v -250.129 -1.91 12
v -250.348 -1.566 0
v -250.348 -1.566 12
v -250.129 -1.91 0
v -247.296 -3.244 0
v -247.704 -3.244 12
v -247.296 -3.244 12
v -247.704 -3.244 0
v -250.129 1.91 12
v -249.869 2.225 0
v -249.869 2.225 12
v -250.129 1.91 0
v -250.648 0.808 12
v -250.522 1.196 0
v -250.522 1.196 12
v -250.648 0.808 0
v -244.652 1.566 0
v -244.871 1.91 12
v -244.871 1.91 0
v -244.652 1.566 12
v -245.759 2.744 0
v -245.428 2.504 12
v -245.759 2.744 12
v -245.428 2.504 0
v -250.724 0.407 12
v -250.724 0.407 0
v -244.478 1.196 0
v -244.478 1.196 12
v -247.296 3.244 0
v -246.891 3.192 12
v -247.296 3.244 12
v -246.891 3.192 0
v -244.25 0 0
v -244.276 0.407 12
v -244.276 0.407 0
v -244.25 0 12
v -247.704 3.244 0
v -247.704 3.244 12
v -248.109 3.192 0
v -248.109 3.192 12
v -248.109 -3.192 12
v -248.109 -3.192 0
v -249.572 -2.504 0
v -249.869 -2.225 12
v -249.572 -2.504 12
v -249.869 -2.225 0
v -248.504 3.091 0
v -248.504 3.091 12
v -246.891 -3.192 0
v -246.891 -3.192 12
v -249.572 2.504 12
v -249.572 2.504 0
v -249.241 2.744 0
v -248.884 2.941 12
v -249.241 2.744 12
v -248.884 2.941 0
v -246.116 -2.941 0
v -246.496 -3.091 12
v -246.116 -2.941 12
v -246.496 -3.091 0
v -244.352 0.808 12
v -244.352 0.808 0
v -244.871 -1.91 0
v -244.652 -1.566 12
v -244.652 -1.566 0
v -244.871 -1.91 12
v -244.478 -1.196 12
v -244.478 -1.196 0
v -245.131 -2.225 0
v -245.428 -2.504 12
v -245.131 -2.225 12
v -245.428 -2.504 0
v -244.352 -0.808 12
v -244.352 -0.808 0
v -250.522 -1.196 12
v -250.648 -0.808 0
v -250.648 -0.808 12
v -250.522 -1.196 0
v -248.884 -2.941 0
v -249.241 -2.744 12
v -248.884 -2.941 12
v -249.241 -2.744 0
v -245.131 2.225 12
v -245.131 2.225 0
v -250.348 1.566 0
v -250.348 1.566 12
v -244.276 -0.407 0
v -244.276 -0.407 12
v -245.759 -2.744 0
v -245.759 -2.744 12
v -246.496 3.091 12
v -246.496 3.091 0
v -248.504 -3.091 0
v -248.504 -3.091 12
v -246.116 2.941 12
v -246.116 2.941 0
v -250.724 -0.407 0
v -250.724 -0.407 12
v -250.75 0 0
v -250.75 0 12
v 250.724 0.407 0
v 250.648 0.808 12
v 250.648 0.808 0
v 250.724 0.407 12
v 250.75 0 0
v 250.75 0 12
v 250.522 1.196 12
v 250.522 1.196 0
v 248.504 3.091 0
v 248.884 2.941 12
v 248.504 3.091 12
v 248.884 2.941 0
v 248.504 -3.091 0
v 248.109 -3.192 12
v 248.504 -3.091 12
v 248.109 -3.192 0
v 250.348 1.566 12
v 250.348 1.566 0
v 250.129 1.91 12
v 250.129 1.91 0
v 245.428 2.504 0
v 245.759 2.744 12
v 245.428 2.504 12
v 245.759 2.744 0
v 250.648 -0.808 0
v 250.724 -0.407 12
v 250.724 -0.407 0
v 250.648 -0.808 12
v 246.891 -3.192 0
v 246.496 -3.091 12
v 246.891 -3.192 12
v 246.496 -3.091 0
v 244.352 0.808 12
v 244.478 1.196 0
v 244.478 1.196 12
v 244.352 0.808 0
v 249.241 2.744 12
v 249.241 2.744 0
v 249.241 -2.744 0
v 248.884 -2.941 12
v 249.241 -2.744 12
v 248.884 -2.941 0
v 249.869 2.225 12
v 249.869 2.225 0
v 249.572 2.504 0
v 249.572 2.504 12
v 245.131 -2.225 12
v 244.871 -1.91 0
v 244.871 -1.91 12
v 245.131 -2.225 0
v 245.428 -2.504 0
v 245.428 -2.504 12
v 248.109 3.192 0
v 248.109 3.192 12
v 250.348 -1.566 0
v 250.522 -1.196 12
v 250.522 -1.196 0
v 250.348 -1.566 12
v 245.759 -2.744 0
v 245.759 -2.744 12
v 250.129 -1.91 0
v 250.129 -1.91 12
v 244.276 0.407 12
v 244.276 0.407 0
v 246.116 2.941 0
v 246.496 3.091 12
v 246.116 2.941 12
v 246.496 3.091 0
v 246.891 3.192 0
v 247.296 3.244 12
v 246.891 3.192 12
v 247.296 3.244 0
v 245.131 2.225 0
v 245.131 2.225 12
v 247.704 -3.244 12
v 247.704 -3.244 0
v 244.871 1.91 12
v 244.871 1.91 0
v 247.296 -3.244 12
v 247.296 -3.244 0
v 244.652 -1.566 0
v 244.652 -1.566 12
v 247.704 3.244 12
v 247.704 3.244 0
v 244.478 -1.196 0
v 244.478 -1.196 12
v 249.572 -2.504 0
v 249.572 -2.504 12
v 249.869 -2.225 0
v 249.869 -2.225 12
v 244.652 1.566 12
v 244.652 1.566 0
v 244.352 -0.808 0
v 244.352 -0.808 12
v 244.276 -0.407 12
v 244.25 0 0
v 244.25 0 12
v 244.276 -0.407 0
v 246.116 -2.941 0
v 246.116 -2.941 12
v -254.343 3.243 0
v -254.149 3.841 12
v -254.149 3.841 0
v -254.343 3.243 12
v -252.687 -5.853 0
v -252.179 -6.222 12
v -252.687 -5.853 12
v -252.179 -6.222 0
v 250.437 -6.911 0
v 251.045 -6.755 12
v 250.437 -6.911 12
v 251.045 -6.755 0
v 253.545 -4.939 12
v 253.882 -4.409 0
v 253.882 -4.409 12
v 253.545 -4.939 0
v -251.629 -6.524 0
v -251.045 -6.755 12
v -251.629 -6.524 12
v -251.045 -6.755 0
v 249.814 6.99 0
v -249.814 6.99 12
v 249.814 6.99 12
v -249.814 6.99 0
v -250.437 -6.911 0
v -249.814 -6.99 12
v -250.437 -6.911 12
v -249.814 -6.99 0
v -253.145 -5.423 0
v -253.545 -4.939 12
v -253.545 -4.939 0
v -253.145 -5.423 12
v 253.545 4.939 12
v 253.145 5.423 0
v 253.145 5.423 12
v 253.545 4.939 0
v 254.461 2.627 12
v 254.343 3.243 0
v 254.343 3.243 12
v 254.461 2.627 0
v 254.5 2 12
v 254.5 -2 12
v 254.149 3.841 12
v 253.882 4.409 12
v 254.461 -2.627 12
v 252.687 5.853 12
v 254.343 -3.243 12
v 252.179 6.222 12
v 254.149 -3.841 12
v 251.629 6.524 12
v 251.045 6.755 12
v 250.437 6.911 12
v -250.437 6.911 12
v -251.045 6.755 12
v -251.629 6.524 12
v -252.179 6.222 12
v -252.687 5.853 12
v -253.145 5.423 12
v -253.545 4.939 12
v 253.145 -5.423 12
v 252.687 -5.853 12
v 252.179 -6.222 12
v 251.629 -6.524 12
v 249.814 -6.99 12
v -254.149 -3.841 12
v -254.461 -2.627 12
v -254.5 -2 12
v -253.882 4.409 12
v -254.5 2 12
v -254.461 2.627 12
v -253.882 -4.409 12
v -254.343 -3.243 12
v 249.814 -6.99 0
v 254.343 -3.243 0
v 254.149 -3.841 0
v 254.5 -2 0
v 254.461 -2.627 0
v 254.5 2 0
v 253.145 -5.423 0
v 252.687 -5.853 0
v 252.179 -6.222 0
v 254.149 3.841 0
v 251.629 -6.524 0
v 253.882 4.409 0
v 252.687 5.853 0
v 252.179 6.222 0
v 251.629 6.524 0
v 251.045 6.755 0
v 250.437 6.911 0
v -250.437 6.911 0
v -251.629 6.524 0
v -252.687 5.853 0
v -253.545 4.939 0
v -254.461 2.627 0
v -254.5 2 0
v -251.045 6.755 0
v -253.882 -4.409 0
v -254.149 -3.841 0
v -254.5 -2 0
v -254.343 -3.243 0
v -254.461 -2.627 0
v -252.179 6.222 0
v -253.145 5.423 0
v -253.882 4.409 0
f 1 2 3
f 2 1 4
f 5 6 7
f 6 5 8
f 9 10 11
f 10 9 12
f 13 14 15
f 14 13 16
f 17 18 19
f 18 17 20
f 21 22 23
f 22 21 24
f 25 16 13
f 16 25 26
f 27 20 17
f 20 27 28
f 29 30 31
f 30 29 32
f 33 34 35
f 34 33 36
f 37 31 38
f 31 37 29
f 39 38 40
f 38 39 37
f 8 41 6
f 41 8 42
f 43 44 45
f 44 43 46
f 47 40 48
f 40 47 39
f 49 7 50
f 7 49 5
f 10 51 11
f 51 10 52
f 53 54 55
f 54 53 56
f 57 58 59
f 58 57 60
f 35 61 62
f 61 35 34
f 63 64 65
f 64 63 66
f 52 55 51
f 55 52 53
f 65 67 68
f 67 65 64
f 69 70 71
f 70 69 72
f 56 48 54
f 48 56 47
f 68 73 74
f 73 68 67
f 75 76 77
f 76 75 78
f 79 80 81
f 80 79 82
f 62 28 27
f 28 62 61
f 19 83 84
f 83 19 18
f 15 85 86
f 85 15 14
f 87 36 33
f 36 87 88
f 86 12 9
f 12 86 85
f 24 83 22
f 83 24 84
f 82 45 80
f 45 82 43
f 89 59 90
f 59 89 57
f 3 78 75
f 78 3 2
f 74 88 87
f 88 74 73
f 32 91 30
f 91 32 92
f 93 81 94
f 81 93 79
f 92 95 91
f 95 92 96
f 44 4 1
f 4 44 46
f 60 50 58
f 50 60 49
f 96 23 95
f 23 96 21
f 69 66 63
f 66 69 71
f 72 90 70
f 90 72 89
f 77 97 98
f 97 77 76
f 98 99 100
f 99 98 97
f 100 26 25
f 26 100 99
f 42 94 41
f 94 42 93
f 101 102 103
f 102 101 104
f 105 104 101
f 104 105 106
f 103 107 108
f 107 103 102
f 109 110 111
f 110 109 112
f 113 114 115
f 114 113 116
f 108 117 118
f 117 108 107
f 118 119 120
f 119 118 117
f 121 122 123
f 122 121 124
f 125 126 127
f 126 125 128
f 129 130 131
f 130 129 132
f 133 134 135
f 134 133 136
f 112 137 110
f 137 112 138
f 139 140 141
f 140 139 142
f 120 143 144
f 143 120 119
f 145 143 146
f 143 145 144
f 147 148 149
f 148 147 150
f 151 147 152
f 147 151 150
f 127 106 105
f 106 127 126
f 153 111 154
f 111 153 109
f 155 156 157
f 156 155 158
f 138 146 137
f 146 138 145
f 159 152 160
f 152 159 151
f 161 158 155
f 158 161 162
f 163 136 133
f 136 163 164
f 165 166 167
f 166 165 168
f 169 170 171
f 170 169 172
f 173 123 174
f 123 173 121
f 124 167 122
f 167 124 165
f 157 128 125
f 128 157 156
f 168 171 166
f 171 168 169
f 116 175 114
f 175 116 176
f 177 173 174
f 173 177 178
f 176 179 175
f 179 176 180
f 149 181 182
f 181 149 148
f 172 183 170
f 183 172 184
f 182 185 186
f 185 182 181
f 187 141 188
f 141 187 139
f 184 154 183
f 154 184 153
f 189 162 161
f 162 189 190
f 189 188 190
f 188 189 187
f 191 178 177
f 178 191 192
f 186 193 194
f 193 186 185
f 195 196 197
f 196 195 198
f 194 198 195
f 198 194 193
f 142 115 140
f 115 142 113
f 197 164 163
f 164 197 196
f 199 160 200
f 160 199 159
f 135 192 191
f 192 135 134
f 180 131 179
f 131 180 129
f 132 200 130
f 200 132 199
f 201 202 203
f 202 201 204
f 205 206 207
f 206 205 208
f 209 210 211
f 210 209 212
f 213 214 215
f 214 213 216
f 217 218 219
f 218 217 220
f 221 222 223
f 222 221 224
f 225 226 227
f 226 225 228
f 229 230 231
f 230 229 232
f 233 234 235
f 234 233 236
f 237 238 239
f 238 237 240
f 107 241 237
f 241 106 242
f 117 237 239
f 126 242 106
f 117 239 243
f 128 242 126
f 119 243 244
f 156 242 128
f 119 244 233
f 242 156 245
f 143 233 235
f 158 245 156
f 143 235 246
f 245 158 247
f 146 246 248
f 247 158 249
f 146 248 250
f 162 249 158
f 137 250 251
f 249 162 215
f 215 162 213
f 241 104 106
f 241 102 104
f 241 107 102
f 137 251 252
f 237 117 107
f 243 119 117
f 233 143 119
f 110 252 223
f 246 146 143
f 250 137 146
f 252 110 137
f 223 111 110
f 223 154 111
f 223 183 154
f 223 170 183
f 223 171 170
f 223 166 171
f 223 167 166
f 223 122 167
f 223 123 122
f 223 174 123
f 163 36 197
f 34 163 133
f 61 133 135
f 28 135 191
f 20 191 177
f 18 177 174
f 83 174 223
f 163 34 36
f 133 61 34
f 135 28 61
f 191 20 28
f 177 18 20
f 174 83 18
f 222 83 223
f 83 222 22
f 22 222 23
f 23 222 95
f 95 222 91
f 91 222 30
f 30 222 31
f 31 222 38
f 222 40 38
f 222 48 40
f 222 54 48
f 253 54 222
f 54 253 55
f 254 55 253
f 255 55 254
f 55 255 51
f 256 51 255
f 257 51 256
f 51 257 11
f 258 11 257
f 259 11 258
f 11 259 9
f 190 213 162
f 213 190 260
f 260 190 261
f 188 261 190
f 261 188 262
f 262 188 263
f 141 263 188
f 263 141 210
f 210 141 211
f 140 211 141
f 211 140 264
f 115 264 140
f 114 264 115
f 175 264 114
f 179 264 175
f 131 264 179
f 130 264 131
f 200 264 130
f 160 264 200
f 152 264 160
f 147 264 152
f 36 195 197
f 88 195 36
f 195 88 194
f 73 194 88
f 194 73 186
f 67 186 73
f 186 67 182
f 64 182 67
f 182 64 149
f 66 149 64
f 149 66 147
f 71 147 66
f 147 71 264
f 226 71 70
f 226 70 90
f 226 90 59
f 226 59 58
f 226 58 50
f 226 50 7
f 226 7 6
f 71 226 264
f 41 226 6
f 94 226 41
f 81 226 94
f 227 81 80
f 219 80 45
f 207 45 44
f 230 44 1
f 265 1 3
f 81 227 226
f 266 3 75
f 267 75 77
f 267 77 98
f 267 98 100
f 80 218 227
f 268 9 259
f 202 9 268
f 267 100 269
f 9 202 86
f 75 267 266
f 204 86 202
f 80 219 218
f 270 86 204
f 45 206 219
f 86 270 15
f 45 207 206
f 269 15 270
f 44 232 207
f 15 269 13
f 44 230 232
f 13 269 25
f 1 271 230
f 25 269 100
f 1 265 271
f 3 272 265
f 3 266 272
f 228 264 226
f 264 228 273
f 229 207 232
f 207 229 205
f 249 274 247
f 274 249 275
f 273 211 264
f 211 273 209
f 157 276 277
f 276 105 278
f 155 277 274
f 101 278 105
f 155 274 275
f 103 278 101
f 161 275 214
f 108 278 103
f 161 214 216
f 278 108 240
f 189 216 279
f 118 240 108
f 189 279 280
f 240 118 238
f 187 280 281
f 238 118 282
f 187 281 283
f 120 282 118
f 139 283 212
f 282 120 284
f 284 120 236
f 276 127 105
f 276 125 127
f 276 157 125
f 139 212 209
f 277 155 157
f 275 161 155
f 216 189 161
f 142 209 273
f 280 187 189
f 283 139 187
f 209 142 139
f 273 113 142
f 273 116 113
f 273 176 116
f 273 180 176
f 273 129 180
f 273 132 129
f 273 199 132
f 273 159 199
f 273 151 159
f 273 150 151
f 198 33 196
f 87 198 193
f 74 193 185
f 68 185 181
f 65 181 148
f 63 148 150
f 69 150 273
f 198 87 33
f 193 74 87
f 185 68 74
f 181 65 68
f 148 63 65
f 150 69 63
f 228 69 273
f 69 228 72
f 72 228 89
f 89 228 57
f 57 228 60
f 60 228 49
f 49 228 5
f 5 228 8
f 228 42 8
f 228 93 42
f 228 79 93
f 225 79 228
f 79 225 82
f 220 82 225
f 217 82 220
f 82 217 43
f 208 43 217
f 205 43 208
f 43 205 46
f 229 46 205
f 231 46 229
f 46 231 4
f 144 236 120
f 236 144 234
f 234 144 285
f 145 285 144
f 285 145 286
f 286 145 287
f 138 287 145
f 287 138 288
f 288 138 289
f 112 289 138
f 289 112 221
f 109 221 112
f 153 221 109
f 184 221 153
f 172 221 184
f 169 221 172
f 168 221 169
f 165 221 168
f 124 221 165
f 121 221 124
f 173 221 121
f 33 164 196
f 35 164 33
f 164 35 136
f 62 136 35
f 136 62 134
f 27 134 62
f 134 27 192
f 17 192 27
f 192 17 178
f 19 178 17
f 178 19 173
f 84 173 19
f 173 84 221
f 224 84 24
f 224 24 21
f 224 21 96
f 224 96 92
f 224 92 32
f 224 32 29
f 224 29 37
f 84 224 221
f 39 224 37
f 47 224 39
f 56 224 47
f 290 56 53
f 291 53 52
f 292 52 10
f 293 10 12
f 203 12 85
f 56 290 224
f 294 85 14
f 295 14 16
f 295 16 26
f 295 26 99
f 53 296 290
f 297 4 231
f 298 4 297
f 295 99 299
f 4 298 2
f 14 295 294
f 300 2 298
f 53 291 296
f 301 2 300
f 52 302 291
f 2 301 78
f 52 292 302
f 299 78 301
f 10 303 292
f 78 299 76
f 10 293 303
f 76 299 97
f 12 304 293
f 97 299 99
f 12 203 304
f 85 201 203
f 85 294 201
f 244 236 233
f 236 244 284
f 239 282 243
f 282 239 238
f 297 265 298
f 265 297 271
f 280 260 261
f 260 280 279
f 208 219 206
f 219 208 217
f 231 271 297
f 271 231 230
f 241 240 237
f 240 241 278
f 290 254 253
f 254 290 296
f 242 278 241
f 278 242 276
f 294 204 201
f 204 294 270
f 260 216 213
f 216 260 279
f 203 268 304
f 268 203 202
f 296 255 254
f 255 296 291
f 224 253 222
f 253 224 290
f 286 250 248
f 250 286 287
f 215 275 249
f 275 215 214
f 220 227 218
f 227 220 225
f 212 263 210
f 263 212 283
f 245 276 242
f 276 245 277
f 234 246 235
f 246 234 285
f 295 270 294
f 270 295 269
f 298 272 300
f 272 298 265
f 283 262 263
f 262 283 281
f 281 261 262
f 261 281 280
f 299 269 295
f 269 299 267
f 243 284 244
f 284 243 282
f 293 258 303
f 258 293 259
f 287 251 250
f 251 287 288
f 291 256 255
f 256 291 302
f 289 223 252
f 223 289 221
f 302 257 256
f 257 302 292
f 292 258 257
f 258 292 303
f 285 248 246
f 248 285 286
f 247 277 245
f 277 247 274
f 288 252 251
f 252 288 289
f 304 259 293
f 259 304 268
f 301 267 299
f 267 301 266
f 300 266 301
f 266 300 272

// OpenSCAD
$fn = 50;


difference() {
	union() {
		hull() {
			translate(v = [-249.5000000000, 2.0000000000, 0]) {
				cylinder(h = 12, r = 5);
			}
			translate(v = [249.5000000000, 2.0000000000, 0]) {
				cylinder(h = 12, r = 5);
			}
			translate(v = [-249.5000000000, -2.0000000000, 0]) {
				cylinder(h = 12, r = 5);
			}
			translate(v = [249.5000000000, -2.0000000000, 0]) {
				cylinder(h = 12, r = 5);
			}
		}
	}
	union() {
		translate(v = [-247.5000000000, 0.0000000000, -100.0000000000]) {
			cylinder(h = 200, r = 3.2500000000);
		}
		translate(v = [-247.5000000000, 0.0000000000, -100.0000000000]) {
			cylinder(h = 200, r = 3.2500000000);
		}
		translate(v = [247.5000000000, 0.0000000000, -100.0000000000]) {
			cylinder(h = 200, r = 3.2500000000);
		}
		translate(v = [247.5000000000, 0.0000000000, -100.0000000000]) {
			cylinder(h = 200, r = 3.2500000000);
		}
	}
}
